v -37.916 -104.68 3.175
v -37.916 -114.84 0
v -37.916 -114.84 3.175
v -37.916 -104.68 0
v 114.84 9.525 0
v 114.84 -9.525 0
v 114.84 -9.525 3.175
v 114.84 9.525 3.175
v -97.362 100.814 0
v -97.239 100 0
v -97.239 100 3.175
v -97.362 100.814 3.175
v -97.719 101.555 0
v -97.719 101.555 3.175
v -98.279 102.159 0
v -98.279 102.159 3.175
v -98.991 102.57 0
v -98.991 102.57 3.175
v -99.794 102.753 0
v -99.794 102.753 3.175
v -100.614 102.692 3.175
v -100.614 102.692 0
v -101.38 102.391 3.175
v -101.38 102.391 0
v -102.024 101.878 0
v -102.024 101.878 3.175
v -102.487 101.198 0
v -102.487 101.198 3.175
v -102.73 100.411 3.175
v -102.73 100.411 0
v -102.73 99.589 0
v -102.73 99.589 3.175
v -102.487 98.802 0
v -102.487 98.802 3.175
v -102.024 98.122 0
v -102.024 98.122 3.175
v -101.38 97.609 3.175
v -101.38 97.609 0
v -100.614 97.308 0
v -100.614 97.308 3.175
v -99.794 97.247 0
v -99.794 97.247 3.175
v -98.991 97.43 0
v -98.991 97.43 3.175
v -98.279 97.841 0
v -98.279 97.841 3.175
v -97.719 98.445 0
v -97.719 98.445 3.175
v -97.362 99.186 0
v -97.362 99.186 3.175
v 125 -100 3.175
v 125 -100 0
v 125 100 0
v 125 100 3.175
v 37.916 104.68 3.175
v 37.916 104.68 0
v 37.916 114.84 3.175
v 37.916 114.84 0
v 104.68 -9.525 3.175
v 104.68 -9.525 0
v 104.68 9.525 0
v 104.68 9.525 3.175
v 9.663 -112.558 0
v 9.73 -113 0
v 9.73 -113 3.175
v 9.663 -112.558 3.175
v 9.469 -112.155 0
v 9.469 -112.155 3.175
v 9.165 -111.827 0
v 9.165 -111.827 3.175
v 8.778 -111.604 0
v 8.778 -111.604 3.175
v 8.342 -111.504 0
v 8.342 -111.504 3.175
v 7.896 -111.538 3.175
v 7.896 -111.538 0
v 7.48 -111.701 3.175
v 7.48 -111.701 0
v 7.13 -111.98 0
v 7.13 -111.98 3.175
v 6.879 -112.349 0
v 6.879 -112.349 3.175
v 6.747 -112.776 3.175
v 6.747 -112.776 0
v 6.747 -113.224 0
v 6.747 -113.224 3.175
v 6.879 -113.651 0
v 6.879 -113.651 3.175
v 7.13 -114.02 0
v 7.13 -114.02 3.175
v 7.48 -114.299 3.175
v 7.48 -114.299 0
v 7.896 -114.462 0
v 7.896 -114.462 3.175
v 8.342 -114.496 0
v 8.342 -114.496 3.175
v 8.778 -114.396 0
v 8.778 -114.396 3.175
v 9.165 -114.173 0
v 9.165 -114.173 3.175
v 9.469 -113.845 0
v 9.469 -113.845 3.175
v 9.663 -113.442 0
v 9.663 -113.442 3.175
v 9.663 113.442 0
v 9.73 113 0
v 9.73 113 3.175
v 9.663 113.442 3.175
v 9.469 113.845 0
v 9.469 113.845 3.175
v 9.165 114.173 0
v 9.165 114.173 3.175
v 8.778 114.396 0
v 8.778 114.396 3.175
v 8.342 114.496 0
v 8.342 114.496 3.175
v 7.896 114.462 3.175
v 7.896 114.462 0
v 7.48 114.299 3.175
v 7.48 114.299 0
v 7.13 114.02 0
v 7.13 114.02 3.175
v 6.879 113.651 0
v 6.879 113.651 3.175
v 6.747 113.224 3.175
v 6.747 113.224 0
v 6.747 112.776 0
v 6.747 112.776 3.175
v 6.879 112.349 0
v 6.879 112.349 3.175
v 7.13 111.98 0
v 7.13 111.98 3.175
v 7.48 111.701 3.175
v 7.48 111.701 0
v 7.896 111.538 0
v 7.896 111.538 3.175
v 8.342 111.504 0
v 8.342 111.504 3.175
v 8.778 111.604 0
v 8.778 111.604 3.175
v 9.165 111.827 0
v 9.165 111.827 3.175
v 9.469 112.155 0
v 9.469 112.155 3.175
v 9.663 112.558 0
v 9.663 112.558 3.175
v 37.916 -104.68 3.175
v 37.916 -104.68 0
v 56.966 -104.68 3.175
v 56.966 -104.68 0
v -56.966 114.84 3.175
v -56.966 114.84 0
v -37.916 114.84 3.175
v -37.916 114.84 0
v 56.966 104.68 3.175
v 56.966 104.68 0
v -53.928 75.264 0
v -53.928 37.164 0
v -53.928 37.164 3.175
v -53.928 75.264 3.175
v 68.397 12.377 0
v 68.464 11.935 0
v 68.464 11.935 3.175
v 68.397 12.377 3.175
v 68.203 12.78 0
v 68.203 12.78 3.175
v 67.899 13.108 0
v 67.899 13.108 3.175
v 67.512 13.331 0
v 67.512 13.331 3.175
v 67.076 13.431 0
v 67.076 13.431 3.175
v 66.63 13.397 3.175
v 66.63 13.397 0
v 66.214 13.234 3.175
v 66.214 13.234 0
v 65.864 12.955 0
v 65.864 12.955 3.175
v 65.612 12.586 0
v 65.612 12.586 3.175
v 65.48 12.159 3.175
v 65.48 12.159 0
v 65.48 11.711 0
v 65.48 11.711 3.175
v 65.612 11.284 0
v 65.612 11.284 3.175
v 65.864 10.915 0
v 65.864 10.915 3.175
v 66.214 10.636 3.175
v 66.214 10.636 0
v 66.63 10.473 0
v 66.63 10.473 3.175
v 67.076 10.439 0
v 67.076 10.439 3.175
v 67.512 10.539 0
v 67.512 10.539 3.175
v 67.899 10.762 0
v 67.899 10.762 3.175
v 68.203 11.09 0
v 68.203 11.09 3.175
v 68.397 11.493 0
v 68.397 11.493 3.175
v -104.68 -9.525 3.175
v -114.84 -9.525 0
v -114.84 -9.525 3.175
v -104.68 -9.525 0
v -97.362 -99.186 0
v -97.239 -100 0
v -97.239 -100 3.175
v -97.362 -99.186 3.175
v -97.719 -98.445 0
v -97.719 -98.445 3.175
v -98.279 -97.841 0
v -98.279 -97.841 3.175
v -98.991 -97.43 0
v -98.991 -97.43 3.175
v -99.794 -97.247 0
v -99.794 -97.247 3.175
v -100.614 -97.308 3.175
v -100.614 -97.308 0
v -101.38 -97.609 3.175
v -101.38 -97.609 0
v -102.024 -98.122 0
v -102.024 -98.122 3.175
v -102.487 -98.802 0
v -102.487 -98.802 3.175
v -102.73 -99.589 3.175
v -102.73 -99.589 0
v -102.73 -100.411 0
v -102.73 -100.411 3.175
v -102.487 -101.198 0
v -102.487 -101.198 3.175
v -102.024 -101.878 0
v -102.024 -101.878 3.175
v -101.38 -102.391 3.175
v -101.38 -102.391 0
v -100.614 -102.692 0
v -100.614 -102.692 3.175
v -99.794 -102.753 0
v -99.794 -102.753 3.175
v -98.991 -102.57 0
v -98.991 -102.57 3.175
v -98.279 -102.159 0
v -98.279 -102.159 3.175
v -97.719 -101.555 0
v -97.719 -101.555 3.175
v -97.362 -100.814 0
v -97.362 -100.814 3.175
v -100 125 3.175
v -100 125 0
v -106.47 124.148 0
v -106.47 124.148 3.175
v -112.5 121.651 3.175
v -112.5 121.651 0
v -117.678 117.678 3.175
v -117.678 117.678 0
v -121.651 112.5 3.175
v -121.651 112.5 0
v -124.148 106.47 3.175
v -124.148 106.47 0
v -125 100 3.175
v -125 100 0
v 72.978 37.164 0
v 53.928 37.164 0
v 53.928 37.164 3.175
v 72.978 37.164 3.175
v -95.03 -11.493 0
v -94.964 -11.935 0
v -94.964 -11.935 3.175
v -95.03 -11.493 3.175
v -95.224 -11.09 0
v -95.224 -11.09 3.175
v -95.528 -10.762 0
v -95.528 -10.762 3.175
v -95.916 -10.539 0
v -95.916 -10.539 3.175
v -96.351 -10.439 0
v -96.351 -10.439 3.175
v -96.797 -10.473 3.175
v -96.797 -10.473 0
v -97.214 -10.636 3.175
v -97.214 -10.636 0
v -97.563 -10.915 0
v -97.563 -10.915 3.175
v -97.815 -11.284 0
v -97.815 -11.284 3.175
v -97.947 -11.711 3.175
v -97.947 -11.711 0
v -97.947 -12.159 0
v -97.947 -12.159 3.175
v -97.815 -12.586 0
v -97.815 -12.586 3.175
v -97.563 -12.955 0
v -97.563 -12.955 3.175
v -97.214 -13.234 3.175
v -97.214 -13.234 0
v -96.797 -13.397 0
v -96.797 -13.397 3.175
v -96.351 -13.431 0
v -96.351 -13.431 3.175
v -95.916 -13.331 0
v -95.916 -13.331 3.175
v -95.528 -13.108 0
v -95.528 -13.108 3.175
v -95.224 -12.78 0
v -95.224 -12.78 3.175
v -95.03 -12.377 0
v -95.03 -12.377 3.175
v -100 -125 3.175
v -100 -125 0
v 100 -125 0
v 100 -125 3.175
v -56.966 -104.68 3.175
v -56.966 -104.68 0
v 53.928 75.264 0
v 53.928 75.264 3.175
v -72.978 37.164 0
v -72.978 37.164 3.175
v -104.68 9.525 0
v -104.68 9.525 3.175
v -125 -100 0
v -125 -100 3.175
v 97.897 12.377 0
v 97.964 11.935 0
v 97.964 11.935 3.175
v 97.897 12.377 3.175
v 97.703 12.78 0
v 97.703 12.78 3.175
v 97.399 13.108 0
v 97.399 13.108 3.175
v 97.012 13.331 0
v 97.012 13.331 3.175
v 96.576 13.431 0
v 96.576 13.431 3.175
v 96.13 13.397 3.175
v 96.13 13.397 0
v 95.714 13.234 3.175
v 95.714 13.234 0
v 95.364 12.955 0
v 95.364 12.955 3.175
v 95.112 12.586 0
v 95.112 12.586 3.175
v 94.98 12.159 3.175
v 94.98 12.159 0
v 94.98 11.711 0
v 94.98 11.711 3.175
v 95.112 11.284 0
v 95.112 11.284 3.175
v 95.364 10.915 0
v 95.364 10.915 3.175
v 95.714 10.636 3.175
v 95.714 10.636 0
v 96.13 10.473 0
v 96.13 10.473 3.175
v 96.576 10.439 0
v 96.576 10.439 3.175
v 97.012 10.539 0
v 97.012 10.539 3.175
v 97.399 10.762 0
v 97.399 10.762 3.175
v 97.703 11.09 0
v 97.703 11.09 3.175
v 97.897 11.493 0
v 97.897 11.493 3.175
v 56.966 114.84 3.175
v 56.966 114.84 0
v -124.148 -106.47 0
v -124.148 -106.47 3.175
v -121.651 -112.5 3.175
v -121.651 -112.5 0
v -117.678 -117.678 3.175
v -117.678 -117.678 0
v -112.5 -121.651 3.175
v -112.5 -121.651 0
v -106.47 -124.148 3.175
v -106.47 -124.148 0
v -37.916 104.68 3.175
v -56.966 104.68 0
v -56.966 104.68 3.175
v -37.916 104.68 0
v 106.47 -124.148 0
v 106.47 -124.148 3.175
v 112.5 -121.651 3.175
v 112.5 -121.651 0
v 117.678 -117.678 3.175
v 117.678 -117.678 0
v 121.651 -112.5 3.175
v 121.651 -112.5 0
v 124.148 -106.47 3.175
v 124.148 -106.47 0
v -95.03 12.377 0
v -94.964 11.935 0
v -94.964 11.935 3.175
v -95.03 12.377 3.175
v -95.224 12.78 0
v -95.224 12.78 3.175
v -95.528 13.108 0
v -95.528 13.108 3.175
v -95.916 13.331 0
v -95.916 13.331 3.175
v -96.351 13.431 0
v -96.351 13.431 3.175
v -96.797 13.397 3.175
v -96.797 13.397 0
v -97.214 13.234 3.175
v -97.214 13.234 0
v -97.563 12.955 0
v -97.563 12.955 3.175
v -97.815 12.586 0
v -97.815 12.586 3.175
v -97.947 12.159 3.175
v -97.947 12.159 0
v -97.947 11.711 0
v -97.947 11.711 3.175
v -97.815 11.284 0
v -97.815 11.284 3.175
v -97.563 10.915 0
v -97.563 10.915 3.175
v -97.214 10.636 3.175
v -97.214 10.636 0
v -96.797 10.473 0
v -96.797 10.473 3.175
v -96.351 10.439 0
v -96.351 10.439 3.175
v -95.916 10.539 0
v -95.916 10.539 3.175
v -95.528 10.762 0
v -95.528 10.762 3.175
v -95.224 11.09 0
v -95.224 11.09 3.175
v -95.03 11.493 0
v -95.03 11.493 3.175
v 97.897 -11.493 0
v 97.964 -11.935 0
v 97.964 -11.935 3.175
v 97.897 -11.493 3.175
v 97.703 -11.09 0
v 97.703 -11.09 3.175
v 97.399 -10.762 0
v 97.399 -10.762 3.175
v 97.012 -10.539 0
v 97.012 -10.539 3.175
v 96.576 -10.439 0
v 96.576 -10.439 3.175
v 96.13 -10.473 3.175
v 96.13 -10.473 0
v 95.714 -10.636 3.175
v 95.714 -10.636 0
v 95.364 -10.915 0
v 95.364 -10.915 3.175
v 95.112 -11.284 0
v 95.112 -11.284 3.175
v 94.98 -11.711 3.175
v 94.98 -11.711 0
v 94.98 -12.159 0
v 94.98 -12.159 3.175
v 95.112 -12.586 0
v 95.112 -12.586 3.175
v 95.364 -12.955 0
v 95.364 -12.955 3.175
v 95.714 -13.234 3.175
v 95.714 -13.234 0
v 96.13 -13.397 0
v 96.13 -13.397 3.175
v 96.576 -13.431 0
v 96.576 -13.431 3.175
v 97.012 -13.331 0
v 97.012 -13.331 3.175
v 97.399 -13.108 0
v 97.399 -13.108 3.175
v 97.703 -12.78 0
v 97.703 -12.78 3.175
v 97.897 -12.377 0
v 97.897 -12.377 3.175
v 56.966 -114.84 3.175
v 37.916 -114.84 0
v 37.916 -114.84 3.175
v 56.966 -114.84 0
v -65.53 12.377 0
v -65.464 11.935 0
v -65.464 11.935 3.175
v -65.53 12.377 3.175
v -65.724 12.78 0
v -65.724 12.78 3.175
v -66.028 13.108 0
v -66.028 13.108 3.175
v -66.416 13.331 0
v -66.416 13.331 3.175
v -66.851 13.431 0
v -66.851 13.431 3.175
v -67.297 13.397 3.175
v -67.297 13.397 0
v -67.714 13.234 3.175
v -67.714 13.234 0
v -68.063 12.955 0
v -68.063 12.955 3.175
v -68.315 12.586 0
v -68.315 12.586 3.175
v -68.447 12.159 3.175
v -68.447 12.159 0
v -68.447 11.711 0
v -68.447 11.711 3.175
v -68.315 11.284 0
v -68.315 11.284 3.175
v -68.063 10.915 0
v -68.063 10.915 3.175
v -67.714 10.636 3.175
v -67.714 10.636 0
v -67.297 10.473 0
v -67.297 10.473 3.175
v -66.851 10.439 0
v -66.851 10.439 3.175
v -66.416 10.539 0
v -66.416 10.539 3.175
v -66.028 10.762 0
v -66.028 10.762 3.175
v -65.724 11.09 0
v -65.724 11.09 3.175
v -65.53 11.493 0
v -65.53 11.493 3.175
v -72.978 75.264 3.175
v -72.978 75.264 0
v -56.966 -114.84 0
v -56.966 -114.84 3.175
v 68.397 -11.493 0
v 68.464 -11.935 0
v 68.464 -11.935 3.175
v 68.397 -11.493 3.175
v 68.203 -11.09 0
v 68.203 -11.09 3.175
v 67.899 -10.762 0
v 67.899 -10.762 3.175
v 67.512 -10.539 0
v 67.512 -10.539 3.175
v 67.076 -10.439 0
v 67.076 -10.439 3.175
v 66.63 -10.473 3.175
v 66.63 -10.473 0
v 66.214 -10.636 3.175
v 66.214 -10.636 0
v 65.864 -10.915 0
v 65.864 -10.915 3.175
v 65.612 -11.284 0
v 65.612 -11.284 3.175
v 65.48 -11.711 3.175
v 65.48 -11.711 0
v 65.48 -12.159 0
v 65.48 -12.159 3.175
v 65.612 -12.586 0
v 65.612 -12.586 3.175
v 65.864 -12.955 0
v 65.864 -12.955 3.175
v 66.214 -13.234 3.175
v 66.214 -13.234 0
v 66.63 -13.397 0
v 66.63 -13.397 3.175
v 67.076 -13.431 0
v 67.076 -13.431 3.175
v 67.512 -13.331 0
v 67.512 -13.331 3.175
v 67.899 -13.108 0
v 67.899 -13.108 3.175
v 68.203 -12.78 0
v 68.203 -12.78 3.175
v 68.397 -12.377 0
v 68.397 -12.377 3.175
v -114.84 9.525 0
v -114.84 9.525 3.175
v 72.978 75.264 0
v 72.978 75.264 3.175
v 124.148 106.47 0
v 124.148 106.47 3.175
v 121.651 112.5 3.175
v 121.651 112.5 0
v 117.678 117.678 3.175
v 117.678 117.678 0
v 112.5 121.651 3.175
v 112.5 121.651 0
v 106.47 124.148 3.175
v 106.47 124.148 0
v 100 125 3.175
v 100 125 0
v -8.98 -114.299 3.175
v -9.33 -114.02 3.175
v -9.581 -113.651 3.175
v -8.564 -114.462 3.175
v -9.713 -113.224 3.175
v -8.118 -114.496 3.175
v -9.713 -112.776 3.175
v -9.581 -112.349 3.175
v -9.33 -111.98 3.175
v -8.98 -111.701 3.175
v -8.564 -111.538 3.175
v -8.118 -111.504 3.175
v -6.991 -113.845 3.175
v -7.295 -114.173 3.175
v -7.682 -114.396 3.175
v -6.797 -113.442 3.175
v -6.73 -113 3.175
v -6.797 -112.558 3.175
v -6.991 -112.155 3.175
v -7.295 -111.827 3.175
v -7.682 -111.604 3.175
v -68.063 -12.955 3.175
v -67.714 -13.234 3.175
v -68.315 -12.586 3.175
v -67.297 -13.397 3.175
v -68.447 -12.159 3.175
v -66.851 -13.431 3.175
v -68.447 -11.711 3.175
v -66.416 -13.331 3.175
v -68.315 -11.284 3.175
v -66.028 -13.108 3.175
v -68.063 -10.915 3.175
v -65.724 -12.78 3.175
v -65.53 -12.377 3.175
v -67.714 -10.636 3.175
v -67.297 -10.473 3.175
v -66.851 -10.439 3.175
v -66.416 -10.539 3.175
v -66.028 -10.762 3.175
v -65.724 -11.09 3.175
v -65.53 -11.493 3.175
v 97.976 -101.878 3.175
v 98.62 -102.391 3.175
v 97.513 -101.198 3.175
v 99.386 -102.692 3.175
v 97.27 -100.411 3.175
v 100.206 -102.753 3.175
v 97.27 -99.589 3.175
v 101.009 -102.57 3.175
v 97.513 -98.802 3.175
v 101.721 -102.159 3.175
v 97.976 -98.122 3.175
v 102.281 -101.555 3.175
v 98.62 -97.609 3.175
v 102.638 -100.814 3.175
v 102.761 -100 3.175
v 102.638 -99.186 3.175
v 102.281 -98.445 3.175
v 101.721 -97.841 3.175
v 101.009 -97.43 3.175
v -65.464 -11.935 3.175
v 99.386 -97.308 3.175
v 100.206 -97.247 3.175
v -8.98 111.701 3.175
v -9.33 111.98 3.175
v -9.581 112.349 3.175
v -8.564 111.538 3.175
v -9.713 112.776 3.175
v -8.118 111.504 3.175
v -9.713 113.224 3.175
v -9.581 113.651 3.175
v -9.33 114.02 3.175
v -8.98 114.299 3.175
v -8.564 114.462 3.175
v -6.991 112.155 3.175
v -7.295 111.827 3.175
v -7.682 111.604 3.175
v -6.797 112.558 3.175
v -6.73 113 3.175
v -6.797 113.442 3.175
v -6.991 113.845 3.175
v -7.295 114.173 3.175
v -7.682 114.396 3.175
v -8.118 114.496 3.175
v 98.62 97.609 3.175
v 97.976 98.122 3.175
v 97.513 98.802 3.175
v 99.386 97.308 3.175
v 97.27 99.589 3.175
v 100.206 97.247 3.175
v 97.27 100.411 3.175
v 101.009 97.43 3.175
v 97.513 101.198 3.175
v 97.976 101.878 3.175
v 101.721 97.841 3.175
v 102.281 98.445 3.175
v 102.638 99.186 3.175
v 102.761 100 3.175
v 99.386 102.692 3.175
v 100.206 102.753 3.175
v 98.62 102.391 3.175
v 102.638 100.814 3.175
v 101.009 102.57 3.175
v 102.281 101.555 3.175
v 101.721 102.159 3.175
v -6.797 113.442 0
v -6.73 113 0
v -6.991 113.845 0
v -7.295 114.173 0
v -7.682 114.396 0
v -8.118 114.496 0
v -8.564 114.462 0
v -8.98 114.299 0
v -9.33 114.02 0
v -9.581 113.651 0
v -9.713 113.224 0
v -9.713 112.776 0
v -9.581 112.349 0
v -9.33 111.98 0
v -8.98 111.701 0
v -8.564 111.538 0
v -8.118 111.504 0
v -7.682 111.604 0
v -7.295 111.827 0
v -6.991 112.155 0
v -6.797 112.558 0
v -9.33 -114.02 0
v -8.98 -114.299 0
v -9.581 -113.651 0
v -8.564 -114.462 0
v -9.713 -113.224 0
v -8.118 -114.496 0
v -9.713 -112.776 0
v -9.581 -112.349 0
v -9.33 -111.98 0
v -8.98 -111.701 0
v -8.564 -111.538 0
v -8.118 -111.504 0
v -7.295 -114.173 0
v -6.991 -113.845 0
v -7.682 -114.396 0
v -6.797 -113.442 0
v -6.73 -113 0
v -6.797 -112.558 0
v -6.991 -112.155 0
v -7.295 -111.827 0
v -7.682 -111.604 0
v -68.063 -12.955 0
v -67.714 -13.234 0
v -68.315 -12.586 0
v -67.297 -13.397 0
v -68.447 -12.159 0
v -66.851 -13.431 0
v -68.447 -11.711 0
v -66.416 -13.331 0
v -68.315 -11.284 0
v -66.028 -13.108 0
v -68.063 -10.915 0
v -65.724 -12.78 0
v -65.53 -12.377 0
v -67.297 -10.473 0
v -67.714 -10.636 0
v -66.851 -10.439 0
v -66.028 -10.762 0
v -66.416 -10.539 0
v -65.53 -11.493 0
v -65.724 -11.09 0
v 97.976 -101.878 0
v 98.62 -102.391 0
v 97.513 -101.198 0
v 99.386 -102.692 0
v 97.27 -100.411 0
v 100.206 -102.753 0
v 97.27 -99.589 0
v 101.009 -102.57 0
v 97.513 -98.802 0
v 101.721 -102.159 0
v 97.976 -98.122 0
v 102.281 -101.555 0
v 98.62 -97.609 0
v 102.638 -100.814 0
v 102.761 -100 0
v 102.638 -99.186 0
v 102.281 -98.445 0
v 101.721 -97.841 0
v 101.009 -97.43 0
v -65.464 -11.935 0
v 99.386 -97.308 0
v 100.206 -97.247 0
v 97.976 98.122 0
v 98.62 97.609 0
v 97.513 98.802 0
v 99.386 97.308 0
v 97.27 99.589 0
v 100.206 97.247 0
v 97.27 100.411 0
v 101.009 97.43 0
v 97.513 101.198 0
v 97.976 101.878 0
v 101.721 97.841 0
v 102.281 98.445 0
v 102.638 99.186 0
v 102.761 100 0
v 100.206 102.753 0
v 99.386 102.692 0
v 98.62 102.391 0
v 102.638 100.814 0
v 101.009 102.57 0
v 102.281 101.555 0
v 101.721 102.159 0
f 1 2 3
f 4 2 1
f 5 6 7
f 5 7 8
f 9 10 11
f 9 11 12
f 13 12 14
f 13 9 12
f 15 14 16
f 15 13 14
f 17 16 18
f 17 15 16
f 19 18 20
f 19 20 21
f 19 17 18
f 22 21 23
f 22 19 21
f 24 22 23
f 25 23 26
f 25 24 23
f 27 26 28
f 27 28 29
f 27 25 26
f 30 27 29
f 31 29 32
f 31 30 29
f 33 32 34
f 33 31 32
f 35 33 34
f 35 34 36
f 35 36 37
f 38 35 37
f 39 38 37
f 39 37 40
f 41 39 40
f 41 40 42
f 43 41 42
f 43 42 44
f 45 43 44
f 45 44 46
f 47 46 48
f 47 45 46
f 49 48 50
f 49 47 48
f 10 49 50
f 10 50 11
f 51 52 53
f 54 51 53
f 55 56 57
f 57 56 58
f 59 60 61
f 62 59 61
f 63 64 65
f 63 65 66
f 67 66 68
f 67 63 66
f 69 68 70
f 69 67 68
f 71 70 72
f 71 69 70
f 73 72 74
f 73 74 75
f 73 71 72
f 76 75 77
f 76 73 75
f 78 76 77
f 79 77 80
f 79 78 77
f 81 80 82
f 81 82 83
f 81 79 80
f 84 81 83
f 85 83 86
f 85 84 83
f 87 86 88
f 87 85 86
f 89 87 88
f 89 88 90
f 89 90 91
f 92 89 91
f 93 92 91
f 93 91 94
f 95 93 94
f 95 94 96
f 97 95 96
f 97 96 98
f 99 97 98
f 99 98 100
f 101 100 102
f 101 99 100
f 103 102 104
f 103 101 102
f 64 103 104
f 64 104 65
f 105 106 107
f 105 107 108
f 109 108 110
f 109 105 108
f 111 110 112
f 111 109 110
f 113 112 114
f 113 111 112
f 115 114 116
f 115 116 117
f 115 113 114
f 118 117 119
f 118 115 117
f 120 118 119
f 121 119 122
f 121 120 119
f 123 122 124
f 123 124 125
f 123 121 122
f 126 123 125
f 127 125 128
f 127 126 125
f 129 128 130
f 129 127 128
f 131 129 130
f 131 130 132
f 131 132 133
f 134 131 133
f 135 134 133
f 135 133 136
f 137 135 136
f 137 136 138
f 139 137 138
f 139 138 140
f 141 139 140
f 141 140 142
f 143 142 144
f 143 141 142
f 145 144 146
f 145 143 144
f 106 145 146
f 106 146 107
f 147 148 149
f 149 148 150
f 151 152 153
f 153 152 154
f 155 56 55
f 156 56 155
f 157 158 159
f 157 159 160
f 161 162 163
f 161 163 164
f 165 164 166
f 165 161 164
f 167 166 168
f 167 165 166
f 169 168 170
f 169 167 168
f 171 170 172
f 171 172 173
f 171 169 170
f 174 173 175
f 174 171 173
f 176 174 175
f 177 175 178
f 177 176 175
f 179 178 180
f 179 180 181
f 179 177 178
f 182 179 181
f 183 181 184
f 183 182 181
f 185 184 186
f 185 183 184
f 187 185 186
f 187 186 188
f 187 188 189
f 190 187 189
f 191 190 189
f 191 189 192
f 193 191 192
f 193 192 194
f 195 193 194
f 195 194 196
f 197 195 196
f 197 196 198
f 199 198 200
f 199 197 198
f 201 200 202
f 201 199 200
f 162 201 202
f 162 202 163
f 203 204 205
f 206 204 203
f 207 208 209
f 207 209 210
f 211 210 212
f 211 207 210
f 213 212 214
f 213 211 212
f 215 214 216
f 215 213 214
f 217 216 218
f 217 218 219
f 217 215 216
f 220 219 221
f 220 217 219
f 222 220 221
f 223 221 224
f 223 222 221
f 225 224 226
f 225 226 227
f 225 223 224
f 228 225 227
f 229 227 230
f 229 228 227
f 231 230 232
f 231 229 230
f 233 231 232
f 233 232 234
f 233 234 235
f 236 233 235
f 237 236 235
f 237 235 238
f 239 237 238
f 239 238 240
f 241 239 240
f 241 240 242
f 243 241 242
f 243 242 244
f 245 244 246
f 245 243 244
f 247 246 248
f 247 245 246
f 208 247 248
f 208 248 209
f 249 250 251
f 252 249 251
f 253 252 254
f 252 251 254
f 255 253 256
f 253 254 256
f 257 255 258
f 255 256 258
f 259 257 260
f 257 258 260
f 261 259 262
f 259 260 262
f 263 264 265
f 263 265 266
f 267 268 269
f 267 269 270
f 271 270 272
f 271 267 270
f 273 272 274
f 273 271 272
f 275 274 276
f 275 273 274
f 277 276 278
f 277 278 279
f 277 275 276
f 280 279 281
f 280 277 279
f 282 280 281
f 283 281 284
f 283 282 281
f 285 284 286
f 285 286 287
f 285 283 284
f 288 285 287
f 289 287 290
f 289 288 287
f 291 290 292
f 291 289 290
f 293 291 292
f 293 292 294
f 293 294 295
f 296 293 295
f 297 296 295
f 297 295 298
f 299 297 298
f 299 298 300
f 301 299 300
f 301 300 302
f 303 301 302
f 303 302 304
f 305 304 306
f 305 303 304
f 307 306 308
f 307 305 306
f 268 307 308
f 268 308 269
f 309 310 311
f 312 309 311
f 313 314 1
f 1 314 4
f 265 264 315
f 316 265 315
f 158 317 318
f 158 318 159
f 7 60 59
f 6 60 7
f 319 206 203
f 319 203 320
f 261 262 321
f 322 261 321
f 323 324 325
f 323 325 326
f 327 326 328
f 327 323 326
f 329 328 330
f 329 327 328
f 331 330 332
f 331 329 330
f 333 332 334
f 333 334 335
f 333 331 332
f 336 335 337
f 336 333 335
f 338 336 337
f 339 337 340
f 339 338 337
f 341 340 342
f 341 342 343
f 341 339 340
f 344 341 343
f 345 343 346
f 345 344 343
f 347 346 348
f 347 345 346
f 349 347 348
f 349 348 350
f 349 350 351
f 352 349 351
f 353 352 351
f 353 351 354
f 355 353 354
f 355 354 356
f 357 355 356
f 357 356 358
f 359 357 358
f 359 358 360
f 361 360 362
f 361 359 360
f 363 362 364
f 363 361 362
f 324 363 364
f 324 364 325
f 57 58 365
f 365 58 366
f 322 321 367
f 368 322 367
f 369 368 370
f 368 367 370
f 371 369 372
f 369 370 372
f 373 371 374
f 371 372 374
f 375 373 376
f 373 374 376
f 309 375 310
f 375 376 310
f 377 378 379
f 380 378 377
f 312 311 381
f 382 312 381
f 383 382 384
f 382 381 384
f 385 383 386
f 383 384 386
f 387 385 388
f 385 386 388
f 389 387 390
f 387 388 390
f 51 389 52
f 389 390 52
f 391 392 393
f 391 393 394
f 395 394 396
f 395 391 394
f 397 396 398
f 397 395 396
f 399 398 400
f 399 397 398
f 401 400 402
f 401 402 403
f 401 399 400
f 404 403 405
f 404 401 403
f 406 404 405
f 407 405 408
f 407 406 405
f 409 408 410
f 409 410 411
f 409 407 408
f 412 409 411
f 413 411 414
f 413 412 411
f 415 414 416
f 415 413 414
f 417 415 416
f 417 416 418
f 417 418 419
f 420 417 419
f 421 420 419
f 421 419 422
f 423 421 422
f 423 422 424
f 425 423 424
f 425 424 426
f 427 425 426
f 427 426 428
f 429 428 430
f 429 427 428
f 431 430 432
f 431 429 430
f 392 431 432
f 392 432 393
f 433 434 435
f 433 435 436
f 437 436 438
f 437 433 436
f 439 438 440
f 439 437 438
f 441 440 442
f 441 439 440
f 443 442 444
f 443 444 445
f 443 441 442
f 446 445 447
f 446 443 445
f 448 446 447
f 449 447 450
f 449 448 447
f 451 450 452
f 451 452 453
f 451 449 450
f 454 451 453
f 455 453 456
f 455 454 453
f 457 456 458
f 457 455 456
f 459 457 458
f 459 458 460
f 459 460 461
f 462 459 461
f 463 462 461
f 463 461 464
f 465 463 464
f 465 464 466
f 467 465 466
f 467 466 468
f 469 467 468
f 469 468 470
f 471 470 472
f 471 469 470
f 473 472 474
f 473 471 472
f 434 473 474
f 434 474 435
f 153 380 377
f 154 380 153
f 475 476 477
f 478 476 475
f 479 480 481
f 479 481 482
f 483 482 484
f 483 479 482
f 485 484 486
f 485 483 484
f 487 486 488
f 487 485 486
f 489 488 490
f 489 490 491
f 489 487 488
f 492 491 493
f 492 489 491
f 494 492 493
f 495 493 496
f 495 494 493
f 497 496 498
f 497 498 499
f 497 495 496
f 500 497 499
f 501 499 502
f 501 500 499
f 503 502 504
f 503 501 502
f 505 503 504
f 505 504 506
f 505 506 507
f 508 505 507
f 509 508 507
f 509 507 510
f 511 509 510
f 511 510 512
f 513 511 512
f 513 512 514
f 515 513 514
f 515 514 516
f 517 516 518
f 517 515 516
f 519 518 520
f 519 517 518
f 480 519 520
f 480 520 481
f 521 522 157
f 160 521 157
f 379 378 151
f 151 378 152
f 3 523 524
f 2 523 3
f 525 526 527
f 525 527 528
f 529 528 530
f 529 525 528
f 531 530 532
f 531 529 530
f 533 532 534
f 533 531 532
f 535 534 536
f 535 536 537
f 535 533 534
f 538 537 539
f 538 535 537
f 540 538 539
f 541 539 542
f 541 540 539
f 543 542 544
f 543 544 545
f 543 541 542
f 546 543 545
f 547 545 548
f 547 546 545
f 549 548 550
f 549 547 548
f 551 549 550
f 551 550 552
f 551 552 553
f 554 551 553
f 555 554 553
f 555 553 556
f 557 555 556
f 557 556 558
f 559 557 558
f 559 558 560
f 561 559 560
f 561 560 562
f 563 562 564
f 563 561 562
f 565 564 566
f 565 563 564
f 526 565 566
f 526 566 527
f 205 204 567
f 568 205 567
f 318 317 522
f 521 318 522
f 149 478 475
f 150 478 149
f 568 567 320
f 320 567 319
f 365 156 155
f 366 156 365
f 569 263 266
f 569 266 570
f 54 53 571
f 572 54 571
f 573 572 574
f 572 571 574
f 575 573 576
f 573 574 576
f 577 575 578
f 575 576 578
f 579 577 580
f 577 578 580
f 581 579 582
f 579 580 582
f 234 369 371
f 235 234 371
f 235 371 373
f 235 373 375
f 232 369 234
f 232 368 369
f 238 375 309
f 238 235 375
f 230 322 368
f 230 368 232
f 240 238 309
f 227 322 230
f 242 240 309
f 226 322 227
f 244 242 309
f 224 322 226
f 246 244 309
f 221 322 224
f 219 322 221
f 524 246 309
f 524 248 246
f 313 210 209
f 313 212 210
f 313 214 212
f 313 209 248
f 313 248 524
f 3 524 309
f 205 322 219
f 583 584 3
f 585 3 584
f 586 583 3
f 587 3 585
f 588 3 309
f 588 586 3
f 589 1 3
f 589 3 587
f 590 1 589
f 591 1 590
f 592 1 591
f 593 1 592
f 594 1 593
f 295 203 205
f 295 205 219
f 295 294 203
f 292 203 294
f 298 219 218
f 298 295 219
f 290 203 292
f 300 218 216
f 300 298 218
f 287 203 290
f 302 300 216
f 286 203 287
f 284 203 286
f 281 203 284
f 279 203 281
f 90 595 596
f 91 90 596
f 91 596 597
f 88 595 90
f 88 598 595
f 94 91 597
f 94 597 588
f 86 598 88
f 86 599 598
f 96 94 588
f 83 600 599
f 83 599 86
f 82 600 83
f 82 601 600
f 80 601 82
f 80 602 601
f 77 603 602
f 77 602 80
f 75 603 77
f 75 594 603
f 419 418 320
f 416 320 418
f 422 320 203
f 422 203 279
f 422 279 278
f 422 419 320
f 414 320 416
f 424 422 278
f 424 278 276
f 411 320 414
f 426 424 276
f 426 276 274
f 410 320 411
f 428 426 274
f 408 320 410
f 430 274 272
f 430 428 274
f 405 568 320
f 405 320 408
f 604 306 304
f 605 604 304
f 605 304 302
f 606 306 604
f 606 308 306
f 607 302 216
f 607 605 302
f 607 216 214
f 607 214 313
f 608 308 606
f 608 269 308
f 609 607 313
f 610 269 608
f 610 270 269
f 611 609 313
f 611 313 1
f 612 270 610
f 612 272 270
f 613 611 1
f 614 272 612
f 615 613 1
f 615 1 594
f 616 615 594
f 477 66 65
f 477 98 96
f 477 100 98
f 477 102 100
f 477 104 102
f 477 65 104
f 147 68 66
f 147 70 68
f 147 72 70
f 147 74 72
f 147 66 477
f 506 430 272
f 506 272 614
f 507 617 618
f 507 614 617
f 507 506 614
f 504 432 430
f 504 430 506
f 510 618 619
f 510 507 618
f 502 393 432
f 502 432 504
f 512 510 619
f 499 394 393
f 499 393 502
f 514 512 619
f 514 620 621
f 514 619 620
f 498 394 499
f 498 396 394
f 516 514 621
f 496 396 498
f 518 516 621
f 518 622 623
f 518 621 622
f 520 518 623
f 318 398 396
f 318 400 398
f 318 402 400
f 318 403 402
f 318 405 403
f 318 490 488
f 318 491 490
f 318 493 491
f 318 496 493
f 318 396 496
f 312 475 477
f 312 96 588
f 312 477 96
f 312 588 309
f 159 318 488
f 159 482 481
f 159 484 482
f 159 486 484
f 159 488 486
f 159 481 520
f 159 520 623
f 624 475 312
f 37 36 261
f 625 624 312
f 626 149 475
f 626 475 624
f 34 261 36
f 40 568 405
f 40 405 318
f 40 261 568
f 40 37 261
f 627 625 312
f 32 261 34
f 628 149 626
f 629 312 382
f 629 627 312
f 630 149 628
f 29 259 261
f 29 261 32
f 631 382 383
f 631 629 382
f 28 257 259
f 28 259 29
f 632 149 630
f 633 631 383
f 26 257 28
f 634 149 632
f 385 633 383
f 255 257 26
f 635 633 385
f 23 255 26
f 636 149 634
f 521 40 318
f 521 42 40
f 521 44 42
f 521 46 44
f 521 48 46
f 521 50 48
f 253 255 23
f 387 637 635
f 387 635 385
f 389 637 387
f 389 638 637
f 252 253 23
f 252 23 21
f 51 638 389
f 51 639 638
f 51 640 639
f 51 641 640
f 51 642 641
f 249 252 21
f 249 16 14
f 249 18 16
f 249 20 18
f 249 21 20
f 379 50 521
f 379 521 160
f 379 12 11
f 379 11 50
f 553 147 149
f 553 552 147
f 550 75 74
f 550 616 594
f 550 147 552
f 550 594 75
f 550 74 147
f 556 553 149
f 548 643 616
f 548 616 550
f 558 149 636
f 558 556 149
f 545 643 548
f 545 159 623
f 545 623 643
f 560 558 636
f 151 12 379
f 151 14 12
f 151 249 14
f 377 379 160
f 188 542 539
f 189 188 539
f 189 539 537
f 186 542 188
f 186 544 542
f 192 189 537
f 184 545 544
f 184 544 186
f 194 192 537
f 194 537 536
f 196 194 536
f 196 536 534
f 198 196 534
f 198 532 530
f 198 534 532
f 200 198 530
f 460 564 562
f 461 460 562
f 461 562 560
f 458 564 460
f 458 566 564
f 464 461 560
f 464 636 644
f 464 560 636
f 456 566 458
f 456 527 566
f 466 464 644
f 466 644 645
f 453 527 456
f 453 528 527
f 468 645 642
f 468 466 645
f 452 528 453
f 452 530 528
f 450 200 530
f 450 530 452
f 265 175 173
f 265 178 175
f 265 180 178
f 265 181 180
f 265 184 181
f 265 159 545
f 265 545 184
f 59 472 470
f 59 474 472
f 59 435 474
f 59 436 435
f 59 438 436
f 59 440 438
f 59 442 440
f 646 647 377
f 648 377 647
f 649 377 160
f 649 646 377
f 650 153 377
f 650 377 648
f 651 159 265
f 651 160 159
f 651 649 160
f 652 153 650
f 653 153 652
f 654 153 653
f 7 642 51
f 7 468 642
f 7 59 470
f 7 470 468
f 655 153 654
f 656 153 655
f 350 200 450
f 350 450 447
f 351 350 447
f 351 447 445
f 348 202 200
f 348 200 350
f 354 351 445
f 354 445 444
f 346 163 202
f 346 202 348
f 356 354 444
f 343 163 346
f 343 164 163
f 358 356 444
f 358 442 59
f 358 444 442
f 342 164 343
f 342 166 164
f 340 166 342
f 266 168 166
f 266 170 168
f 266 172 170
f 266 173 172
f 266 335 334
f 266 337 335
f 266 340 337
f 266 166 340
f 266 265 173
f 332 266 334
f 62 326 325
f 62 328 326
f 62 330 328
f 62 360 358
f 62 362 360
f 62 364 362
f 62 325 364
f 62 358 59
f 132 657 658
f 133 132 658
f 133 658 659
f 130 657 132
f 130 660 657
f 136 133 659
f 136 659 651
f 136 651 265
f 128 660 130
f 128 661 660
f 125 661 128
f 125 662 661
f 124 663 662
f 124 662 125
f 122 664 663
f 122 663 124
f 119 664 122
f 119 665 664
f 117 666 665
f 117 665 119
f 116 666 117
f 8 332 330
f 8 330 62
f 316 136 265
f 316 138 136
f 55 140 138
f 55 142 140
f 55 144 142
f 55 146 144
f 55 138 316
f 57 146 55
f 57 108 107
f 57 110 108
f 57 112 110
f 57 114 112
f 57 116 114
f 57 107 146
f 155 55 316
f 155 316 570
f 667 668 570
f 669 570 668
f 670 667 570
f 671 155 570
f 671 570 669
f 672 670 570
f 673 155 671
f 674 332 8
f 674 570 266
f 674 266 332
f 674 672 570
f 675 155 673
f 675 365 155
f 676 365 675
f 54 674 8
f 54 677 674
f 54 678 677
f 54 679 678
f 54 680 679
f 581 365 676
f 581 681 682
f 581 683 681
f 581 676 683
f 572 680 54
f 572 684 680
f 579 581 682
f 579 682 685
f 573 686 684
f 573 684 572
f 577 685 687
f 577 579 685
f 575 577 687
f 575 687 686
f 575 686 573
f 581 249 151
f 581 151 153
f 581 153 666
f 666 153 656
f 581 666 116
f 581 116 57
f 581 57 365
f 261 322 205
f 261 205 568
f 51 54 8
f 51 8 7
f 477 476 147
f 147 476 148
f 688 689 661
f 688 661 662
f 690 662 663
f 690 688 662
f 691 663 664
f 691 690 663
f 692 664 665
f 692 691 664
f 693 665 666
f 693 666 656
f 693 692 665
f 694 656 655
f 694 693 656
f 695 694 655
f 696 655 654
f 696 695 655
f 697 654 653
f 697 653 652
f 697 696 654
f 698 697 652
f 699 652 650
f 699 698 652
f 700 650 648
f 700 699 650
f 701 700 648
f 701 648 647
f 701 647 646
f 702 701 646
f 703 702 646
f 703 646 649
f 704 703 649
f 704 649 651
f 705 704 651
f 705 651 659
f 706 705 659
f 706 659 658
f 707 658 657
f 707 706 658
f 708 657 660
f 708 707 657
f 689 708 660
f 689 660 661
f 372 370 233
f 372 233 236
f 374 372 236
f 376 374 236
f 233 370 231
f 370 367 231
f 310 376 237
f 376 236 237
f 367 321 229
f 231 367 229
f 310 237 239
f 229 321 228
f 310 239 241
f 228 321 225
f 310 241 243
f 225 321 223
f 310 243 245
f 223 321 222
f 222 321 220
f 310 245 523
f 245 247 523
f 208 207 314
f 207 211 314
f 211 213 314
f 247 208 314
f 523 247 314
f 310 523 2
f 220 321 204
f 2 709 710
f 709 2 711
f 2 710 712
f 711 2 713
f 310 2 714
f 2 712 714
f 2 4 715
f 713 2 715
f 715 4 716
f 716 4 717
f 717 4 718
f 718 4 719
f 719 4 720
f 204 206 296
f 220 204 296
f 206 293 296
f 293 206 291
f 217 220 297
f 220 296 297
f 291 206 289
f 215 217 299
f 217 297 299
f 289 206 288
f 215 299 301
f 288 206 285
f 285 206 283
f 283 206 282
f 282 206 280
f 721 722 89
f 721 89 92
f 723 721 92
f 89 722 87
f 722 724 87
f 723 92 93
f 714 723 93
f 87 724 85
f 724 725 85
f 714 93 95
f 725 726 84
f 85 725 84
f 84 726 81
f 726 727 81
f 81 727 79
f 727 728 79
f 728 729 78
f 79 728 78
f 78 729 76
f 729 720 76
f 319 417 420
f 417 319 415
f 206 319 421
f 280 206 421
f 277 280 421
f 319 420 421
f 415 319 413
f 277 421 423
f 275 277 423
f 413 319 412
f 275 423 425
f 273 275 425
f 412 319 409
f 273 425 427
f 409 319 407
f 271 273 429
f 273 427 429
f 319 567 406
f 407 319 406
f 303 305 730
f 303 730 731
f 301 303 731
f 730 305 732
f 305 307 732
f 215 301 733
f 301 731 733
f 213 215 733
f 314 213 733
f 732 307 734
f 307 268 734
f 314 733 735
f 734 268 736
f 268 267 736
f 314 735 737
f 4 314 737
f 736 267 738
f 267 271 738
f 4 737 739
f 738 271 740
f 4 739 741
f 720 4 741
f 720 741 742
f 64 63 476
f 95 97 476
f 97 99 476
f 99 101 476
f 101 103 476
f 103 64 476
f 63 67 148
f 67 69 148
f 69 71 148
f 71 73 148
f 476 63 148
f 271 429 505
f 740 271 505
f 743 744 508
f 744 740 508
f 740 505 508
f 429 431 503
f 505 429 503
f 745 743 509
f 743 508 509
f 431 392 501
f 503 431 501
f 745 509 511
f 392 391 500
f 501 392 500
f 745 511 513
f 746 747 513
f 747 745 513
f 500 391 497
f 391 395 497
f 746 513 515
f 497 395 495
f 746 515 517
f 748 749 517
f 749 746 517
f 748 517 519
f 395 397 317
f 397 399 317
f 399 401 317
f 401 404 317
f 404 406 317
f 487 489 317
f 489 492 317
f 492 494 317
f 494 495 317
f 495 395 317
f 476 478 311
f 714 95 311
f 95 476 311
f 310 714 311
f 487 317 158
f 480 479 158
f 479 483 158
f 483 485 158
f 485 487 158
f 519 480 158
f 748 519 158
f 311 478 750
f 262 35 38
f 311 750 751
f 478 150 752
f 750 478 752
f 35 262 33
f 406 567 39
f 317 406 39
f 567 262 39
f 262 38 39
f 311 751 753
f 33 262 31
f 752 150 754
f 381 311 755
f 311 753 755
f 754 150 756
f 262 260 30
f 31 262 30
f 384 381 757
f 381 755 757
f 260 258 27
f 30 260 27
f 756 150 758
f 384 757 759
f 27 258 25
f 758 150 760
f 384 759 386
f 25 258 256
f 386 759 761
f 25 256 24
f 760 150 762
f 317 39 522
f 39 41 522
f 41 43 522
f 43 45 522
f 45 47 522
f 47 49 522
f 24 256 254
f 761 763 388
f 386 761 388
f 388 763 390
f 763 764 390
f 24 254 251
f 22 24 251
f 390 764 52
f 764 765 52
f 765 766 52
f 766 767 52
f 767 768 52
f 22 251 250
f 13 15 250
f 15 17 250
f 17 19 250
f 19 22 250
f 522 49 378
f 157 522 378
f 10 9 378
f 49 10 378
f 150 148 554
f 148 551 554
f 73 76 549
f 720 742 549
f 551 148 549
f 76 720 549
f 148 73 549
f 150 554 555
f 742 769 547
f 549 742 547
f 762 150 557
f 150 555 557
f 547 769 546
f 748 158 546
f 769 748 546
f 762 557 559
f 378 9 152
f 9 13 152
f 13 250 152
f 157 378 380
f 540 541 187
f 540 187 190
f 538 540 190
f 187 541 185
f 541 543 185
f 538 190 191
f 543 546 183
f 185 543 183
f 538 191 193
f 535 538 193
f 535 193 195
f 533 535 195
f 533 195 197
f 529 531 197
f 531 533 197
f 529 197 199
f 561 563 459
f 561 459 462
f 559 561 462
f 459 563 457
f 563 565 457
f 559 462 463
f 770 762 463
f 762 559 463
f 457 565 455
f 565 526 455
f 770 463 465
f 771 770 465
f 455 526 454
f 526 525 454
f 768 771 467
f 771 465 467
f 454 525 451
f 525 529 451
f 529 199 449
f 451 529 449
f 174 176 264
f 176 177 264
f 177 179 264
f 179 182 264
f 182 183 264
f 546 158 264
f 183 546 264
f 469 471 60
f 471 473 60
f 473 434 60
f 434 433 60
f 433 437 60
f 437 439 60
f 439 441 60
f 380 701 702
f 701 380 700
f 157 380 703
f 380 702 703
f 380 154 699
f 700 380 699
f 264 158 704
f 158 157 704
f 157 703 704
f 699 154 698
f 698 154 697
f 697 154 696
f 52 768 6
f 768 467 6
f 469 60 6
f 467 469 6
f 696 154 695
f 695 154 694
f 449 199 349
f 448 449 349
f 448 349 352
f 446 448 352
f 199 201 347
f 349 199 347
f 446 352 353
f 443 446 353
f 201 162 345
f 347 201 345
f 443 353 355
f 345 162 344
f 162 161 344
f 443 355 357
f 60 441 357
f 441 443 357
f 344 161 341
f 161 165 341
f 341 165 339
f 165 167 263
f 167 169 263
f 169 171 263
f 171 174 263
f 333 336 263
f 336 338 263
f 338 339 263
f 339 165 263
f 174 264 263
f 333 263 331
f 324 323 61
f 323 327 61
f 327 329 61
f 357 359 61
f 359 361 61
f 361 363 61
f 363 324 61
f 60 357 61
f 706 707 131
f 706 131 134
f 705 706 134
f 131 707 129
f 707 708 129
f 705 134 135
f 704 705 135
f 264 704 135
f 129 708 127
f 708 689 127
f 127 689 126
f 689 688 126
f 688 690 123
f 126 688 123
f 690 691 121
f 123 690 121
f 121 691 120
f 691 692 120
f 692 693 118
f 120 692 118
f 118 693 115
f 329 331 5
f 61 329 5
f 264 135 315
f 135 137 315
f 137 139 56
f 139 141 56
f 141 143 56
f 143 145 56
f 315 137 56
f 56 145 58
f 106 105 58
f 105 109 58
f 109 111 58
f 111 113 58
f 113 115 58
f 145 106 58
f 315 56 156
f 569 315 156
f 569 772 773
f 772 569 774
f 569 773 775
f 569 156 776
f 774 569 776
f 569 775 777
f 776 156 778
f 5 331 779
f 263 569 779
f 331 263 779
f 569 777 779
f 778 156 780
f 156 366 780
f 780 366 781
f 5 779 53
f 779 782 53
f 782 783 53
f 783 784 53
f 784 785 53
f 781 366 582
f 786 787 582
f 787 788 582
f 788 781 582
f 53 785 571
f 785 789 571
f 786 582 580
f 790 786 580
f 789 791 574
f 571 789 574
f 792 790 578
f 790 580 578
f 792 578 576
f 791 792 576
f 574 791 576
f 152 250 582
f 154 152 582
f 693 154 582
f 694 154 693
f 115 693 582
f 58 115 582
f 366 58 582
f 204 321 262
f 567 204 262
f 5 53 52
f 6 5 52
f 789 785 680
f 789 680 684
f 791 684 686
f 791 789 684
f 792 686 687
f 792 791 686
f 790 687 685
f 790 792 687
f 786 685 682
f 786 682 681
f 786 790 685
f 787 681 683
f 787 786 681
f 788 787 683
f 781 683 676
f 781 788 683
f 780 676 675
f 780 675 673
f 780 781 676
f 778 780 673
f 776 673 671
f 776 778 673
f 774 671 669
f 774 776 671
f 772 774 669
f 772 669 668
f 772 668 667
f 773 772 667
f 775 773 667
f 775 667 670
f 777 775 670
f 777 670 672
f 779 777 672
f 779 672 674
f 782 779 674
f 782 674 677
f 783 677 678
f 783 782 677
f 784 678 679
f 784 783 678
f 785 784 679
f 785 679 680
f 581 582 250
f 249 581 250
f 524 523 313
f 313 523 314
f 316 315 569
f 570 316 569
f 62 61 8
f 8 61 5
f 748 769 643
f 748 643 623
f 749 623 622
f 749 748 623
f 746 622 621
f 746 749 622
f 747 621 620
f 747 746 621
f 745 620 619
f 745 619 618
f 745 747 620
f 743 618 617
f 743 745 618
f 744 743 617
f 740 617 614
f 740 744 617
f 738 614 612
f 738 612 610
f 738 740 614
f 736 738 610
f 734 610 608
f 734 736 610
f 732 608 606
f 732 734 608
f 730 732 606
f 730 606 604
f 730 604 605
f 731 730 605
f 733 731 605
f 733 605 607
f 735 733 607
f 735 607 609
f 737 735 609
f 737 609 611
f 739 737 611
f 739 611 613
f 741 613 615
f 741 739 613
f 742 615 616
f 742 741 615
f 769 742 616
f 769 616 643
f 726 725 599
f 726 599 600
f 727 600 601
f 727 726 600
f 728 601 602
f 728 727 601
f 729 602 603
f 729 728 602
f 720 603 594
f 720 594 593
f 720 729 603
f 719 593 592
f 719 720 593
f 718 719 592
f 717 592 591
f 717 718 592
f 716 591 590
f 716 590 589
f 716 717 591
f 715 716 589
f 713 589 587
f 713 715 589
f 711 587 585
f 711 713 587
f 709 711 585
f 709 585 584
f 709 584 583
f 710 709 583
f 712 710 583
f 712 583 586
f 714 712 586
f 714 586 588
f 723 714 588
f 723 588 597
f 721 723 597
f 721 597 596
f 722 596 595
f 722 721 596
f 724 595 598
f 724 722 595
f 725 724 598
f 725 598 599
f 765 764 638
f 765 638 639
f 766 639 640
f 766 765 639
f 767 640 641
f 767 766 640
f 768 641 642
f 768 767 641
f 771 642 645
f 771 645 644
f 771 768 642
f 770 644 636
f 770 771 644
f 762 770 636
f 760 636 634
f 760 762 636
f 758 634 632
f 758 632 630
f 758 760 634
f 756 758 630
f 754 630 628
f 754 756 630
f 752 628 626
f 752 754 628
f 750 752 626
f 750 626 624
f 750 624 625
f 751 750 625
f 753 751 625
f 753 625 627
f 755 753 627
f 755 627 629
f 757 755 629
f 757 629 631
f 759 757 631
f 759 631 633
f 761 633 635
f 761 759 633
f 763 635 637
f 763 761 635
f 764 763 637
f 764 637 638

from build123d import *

# Parameters (mm, degrees)
F0_R     = 2.7608867496
F0_W     = 19.05
F0_H     = 10.16
F0_R_2   = 1.5
F0_W_2   = 10.16
F0_H_2   = 19.05
F0_H_3   = 38.1
F1_DEPTH = 3.175


# Not quite as in the source:
# - a length typed as a fraction of an inch, garbled in the dataset ("3 / 203.2 mm" for 3/8 in), is restored


with BuildPart() as f1:
    # F0 (on Top) → F1 (new body)
    with BuildSketch(Plane.XY):
        with BuildLine():
            Line((100, 125), (-100, 125))
            ThreePointArc((-100, 125), (-117.6776695297, 117.6776695297), (-125, 100))
            Line((-125, 100), (-125, -100))
            ThreePointArc((-125, -100), (-117.6776695297, -117.6776695297), (-100, -125))
            Line((-100, -125), (100, -125))
            ThreePointArc((100, -125), (117.6776695297, -117.6776695297), (125, -100))
            Line((125, -100), (125, 100))
            ThreePointArc((125, 100), (117.6776695297, 117.6776695297), (100, 125))
        make_face()
        with Locations((-100, -100)):
            Circle(F0_R, mode=Mode.SUBTRACT)
        with Locations((-47.4411445916, -109.76)):
            Rectangle(F0_W, F0_H, mode=Mode.SUBTRACT)
        with Locations((-8.23, -113)):
            Circle(F0_R_2, mode=Mode.SUBTRACT)
        with Locations((-96.4635497928, -11.935)):
            Circle(F0_R_2, mode=Mode.SUBTRACT)
        with Locations((-66.9635497928, -11.935)):
            Circle(F0_R_2, mode=Mode.SUBTRACT)
        with Locations((8.23, -113)):
            Circle(F0_R_2, mode=Mode.SUBTRACT)
        with Locations((47.4411445916, -109.76)):
            Rectangle(F0_W, F0_H, mode=Mode.SUBTRACT)
        with Locations((100, -100)):
            Circle(F0_R, mode=Mode.SUBTRACT)
        with Locations((66.9635497928, -11.935)):
            Circle(F0_R_2, mode=Mode.SUBTRACT)
        with Locations((96.4635497928, -11.935)):
            Circle(F0_R_2, mode=Mode.SUBTRACT)
        with Locations((-109.76, 0)):
            Rectangle(F0_W_2, F0_H_2, mode=Mode.SUBTRACT)
        with Locations((-96.4635497928, 11.935)):
            Circle(F0_R_2, mode=Mode.SUBTRACT)
        with Locations((-66.9635497928, 11.935)):
            Circle(F0_R_2, mode=Mode.SUBTRACT)
        with Locations((-63.4532595247, 56.2142550719)):
            Rectangle(F0_W, F0_H_3, mode=Mode.SUBTRACT)
        with Locations((-100, 100)):
            Circle(F0_R, mode=Mode.SUBTRACT)
        with Locations((-47.4411445916, 109.76)):
            Rectangle(F0_W, F0_H, mode=Mode.SUBTRACT)
        with Locations((-8.23, 113)):
            Circle(F0_R_2, mode=Mode.SUBTRACT)
        with Locations((66.9635497928, 11.935)):
            Circle(F0_R_2, mode=Mode.SUBTRACT)
        with Locations((96.4635497928, 11.935)):
            Circle(F0_R_2, mode=Mode.SUBTRACT)
        with Locations((109.76, 0)):
            Rectangle(F0_W_2, F0_H_2, mode=Mode.SUBTRACT)
        with Locations((63.4532595247, 56.2142550719)):
            Rectangle(F0_W, F0_H_3, mode=Mode.SUBTRACT)
        with Locations((8.23, 113)):
            Circle(F0_R_2, mode=Mode.SUBTRACT)
        with Locations((47.4411445916, 109.76)):
            Rectangle(F0_W, F0_H, mode=Mode.SUBTRACT)
        with Locations((100, 100)):
            Circle(F0_R, mode=Mode.SUBTRACT)
    extrude(amount=F1_DEPTH)


solid = f1.part
